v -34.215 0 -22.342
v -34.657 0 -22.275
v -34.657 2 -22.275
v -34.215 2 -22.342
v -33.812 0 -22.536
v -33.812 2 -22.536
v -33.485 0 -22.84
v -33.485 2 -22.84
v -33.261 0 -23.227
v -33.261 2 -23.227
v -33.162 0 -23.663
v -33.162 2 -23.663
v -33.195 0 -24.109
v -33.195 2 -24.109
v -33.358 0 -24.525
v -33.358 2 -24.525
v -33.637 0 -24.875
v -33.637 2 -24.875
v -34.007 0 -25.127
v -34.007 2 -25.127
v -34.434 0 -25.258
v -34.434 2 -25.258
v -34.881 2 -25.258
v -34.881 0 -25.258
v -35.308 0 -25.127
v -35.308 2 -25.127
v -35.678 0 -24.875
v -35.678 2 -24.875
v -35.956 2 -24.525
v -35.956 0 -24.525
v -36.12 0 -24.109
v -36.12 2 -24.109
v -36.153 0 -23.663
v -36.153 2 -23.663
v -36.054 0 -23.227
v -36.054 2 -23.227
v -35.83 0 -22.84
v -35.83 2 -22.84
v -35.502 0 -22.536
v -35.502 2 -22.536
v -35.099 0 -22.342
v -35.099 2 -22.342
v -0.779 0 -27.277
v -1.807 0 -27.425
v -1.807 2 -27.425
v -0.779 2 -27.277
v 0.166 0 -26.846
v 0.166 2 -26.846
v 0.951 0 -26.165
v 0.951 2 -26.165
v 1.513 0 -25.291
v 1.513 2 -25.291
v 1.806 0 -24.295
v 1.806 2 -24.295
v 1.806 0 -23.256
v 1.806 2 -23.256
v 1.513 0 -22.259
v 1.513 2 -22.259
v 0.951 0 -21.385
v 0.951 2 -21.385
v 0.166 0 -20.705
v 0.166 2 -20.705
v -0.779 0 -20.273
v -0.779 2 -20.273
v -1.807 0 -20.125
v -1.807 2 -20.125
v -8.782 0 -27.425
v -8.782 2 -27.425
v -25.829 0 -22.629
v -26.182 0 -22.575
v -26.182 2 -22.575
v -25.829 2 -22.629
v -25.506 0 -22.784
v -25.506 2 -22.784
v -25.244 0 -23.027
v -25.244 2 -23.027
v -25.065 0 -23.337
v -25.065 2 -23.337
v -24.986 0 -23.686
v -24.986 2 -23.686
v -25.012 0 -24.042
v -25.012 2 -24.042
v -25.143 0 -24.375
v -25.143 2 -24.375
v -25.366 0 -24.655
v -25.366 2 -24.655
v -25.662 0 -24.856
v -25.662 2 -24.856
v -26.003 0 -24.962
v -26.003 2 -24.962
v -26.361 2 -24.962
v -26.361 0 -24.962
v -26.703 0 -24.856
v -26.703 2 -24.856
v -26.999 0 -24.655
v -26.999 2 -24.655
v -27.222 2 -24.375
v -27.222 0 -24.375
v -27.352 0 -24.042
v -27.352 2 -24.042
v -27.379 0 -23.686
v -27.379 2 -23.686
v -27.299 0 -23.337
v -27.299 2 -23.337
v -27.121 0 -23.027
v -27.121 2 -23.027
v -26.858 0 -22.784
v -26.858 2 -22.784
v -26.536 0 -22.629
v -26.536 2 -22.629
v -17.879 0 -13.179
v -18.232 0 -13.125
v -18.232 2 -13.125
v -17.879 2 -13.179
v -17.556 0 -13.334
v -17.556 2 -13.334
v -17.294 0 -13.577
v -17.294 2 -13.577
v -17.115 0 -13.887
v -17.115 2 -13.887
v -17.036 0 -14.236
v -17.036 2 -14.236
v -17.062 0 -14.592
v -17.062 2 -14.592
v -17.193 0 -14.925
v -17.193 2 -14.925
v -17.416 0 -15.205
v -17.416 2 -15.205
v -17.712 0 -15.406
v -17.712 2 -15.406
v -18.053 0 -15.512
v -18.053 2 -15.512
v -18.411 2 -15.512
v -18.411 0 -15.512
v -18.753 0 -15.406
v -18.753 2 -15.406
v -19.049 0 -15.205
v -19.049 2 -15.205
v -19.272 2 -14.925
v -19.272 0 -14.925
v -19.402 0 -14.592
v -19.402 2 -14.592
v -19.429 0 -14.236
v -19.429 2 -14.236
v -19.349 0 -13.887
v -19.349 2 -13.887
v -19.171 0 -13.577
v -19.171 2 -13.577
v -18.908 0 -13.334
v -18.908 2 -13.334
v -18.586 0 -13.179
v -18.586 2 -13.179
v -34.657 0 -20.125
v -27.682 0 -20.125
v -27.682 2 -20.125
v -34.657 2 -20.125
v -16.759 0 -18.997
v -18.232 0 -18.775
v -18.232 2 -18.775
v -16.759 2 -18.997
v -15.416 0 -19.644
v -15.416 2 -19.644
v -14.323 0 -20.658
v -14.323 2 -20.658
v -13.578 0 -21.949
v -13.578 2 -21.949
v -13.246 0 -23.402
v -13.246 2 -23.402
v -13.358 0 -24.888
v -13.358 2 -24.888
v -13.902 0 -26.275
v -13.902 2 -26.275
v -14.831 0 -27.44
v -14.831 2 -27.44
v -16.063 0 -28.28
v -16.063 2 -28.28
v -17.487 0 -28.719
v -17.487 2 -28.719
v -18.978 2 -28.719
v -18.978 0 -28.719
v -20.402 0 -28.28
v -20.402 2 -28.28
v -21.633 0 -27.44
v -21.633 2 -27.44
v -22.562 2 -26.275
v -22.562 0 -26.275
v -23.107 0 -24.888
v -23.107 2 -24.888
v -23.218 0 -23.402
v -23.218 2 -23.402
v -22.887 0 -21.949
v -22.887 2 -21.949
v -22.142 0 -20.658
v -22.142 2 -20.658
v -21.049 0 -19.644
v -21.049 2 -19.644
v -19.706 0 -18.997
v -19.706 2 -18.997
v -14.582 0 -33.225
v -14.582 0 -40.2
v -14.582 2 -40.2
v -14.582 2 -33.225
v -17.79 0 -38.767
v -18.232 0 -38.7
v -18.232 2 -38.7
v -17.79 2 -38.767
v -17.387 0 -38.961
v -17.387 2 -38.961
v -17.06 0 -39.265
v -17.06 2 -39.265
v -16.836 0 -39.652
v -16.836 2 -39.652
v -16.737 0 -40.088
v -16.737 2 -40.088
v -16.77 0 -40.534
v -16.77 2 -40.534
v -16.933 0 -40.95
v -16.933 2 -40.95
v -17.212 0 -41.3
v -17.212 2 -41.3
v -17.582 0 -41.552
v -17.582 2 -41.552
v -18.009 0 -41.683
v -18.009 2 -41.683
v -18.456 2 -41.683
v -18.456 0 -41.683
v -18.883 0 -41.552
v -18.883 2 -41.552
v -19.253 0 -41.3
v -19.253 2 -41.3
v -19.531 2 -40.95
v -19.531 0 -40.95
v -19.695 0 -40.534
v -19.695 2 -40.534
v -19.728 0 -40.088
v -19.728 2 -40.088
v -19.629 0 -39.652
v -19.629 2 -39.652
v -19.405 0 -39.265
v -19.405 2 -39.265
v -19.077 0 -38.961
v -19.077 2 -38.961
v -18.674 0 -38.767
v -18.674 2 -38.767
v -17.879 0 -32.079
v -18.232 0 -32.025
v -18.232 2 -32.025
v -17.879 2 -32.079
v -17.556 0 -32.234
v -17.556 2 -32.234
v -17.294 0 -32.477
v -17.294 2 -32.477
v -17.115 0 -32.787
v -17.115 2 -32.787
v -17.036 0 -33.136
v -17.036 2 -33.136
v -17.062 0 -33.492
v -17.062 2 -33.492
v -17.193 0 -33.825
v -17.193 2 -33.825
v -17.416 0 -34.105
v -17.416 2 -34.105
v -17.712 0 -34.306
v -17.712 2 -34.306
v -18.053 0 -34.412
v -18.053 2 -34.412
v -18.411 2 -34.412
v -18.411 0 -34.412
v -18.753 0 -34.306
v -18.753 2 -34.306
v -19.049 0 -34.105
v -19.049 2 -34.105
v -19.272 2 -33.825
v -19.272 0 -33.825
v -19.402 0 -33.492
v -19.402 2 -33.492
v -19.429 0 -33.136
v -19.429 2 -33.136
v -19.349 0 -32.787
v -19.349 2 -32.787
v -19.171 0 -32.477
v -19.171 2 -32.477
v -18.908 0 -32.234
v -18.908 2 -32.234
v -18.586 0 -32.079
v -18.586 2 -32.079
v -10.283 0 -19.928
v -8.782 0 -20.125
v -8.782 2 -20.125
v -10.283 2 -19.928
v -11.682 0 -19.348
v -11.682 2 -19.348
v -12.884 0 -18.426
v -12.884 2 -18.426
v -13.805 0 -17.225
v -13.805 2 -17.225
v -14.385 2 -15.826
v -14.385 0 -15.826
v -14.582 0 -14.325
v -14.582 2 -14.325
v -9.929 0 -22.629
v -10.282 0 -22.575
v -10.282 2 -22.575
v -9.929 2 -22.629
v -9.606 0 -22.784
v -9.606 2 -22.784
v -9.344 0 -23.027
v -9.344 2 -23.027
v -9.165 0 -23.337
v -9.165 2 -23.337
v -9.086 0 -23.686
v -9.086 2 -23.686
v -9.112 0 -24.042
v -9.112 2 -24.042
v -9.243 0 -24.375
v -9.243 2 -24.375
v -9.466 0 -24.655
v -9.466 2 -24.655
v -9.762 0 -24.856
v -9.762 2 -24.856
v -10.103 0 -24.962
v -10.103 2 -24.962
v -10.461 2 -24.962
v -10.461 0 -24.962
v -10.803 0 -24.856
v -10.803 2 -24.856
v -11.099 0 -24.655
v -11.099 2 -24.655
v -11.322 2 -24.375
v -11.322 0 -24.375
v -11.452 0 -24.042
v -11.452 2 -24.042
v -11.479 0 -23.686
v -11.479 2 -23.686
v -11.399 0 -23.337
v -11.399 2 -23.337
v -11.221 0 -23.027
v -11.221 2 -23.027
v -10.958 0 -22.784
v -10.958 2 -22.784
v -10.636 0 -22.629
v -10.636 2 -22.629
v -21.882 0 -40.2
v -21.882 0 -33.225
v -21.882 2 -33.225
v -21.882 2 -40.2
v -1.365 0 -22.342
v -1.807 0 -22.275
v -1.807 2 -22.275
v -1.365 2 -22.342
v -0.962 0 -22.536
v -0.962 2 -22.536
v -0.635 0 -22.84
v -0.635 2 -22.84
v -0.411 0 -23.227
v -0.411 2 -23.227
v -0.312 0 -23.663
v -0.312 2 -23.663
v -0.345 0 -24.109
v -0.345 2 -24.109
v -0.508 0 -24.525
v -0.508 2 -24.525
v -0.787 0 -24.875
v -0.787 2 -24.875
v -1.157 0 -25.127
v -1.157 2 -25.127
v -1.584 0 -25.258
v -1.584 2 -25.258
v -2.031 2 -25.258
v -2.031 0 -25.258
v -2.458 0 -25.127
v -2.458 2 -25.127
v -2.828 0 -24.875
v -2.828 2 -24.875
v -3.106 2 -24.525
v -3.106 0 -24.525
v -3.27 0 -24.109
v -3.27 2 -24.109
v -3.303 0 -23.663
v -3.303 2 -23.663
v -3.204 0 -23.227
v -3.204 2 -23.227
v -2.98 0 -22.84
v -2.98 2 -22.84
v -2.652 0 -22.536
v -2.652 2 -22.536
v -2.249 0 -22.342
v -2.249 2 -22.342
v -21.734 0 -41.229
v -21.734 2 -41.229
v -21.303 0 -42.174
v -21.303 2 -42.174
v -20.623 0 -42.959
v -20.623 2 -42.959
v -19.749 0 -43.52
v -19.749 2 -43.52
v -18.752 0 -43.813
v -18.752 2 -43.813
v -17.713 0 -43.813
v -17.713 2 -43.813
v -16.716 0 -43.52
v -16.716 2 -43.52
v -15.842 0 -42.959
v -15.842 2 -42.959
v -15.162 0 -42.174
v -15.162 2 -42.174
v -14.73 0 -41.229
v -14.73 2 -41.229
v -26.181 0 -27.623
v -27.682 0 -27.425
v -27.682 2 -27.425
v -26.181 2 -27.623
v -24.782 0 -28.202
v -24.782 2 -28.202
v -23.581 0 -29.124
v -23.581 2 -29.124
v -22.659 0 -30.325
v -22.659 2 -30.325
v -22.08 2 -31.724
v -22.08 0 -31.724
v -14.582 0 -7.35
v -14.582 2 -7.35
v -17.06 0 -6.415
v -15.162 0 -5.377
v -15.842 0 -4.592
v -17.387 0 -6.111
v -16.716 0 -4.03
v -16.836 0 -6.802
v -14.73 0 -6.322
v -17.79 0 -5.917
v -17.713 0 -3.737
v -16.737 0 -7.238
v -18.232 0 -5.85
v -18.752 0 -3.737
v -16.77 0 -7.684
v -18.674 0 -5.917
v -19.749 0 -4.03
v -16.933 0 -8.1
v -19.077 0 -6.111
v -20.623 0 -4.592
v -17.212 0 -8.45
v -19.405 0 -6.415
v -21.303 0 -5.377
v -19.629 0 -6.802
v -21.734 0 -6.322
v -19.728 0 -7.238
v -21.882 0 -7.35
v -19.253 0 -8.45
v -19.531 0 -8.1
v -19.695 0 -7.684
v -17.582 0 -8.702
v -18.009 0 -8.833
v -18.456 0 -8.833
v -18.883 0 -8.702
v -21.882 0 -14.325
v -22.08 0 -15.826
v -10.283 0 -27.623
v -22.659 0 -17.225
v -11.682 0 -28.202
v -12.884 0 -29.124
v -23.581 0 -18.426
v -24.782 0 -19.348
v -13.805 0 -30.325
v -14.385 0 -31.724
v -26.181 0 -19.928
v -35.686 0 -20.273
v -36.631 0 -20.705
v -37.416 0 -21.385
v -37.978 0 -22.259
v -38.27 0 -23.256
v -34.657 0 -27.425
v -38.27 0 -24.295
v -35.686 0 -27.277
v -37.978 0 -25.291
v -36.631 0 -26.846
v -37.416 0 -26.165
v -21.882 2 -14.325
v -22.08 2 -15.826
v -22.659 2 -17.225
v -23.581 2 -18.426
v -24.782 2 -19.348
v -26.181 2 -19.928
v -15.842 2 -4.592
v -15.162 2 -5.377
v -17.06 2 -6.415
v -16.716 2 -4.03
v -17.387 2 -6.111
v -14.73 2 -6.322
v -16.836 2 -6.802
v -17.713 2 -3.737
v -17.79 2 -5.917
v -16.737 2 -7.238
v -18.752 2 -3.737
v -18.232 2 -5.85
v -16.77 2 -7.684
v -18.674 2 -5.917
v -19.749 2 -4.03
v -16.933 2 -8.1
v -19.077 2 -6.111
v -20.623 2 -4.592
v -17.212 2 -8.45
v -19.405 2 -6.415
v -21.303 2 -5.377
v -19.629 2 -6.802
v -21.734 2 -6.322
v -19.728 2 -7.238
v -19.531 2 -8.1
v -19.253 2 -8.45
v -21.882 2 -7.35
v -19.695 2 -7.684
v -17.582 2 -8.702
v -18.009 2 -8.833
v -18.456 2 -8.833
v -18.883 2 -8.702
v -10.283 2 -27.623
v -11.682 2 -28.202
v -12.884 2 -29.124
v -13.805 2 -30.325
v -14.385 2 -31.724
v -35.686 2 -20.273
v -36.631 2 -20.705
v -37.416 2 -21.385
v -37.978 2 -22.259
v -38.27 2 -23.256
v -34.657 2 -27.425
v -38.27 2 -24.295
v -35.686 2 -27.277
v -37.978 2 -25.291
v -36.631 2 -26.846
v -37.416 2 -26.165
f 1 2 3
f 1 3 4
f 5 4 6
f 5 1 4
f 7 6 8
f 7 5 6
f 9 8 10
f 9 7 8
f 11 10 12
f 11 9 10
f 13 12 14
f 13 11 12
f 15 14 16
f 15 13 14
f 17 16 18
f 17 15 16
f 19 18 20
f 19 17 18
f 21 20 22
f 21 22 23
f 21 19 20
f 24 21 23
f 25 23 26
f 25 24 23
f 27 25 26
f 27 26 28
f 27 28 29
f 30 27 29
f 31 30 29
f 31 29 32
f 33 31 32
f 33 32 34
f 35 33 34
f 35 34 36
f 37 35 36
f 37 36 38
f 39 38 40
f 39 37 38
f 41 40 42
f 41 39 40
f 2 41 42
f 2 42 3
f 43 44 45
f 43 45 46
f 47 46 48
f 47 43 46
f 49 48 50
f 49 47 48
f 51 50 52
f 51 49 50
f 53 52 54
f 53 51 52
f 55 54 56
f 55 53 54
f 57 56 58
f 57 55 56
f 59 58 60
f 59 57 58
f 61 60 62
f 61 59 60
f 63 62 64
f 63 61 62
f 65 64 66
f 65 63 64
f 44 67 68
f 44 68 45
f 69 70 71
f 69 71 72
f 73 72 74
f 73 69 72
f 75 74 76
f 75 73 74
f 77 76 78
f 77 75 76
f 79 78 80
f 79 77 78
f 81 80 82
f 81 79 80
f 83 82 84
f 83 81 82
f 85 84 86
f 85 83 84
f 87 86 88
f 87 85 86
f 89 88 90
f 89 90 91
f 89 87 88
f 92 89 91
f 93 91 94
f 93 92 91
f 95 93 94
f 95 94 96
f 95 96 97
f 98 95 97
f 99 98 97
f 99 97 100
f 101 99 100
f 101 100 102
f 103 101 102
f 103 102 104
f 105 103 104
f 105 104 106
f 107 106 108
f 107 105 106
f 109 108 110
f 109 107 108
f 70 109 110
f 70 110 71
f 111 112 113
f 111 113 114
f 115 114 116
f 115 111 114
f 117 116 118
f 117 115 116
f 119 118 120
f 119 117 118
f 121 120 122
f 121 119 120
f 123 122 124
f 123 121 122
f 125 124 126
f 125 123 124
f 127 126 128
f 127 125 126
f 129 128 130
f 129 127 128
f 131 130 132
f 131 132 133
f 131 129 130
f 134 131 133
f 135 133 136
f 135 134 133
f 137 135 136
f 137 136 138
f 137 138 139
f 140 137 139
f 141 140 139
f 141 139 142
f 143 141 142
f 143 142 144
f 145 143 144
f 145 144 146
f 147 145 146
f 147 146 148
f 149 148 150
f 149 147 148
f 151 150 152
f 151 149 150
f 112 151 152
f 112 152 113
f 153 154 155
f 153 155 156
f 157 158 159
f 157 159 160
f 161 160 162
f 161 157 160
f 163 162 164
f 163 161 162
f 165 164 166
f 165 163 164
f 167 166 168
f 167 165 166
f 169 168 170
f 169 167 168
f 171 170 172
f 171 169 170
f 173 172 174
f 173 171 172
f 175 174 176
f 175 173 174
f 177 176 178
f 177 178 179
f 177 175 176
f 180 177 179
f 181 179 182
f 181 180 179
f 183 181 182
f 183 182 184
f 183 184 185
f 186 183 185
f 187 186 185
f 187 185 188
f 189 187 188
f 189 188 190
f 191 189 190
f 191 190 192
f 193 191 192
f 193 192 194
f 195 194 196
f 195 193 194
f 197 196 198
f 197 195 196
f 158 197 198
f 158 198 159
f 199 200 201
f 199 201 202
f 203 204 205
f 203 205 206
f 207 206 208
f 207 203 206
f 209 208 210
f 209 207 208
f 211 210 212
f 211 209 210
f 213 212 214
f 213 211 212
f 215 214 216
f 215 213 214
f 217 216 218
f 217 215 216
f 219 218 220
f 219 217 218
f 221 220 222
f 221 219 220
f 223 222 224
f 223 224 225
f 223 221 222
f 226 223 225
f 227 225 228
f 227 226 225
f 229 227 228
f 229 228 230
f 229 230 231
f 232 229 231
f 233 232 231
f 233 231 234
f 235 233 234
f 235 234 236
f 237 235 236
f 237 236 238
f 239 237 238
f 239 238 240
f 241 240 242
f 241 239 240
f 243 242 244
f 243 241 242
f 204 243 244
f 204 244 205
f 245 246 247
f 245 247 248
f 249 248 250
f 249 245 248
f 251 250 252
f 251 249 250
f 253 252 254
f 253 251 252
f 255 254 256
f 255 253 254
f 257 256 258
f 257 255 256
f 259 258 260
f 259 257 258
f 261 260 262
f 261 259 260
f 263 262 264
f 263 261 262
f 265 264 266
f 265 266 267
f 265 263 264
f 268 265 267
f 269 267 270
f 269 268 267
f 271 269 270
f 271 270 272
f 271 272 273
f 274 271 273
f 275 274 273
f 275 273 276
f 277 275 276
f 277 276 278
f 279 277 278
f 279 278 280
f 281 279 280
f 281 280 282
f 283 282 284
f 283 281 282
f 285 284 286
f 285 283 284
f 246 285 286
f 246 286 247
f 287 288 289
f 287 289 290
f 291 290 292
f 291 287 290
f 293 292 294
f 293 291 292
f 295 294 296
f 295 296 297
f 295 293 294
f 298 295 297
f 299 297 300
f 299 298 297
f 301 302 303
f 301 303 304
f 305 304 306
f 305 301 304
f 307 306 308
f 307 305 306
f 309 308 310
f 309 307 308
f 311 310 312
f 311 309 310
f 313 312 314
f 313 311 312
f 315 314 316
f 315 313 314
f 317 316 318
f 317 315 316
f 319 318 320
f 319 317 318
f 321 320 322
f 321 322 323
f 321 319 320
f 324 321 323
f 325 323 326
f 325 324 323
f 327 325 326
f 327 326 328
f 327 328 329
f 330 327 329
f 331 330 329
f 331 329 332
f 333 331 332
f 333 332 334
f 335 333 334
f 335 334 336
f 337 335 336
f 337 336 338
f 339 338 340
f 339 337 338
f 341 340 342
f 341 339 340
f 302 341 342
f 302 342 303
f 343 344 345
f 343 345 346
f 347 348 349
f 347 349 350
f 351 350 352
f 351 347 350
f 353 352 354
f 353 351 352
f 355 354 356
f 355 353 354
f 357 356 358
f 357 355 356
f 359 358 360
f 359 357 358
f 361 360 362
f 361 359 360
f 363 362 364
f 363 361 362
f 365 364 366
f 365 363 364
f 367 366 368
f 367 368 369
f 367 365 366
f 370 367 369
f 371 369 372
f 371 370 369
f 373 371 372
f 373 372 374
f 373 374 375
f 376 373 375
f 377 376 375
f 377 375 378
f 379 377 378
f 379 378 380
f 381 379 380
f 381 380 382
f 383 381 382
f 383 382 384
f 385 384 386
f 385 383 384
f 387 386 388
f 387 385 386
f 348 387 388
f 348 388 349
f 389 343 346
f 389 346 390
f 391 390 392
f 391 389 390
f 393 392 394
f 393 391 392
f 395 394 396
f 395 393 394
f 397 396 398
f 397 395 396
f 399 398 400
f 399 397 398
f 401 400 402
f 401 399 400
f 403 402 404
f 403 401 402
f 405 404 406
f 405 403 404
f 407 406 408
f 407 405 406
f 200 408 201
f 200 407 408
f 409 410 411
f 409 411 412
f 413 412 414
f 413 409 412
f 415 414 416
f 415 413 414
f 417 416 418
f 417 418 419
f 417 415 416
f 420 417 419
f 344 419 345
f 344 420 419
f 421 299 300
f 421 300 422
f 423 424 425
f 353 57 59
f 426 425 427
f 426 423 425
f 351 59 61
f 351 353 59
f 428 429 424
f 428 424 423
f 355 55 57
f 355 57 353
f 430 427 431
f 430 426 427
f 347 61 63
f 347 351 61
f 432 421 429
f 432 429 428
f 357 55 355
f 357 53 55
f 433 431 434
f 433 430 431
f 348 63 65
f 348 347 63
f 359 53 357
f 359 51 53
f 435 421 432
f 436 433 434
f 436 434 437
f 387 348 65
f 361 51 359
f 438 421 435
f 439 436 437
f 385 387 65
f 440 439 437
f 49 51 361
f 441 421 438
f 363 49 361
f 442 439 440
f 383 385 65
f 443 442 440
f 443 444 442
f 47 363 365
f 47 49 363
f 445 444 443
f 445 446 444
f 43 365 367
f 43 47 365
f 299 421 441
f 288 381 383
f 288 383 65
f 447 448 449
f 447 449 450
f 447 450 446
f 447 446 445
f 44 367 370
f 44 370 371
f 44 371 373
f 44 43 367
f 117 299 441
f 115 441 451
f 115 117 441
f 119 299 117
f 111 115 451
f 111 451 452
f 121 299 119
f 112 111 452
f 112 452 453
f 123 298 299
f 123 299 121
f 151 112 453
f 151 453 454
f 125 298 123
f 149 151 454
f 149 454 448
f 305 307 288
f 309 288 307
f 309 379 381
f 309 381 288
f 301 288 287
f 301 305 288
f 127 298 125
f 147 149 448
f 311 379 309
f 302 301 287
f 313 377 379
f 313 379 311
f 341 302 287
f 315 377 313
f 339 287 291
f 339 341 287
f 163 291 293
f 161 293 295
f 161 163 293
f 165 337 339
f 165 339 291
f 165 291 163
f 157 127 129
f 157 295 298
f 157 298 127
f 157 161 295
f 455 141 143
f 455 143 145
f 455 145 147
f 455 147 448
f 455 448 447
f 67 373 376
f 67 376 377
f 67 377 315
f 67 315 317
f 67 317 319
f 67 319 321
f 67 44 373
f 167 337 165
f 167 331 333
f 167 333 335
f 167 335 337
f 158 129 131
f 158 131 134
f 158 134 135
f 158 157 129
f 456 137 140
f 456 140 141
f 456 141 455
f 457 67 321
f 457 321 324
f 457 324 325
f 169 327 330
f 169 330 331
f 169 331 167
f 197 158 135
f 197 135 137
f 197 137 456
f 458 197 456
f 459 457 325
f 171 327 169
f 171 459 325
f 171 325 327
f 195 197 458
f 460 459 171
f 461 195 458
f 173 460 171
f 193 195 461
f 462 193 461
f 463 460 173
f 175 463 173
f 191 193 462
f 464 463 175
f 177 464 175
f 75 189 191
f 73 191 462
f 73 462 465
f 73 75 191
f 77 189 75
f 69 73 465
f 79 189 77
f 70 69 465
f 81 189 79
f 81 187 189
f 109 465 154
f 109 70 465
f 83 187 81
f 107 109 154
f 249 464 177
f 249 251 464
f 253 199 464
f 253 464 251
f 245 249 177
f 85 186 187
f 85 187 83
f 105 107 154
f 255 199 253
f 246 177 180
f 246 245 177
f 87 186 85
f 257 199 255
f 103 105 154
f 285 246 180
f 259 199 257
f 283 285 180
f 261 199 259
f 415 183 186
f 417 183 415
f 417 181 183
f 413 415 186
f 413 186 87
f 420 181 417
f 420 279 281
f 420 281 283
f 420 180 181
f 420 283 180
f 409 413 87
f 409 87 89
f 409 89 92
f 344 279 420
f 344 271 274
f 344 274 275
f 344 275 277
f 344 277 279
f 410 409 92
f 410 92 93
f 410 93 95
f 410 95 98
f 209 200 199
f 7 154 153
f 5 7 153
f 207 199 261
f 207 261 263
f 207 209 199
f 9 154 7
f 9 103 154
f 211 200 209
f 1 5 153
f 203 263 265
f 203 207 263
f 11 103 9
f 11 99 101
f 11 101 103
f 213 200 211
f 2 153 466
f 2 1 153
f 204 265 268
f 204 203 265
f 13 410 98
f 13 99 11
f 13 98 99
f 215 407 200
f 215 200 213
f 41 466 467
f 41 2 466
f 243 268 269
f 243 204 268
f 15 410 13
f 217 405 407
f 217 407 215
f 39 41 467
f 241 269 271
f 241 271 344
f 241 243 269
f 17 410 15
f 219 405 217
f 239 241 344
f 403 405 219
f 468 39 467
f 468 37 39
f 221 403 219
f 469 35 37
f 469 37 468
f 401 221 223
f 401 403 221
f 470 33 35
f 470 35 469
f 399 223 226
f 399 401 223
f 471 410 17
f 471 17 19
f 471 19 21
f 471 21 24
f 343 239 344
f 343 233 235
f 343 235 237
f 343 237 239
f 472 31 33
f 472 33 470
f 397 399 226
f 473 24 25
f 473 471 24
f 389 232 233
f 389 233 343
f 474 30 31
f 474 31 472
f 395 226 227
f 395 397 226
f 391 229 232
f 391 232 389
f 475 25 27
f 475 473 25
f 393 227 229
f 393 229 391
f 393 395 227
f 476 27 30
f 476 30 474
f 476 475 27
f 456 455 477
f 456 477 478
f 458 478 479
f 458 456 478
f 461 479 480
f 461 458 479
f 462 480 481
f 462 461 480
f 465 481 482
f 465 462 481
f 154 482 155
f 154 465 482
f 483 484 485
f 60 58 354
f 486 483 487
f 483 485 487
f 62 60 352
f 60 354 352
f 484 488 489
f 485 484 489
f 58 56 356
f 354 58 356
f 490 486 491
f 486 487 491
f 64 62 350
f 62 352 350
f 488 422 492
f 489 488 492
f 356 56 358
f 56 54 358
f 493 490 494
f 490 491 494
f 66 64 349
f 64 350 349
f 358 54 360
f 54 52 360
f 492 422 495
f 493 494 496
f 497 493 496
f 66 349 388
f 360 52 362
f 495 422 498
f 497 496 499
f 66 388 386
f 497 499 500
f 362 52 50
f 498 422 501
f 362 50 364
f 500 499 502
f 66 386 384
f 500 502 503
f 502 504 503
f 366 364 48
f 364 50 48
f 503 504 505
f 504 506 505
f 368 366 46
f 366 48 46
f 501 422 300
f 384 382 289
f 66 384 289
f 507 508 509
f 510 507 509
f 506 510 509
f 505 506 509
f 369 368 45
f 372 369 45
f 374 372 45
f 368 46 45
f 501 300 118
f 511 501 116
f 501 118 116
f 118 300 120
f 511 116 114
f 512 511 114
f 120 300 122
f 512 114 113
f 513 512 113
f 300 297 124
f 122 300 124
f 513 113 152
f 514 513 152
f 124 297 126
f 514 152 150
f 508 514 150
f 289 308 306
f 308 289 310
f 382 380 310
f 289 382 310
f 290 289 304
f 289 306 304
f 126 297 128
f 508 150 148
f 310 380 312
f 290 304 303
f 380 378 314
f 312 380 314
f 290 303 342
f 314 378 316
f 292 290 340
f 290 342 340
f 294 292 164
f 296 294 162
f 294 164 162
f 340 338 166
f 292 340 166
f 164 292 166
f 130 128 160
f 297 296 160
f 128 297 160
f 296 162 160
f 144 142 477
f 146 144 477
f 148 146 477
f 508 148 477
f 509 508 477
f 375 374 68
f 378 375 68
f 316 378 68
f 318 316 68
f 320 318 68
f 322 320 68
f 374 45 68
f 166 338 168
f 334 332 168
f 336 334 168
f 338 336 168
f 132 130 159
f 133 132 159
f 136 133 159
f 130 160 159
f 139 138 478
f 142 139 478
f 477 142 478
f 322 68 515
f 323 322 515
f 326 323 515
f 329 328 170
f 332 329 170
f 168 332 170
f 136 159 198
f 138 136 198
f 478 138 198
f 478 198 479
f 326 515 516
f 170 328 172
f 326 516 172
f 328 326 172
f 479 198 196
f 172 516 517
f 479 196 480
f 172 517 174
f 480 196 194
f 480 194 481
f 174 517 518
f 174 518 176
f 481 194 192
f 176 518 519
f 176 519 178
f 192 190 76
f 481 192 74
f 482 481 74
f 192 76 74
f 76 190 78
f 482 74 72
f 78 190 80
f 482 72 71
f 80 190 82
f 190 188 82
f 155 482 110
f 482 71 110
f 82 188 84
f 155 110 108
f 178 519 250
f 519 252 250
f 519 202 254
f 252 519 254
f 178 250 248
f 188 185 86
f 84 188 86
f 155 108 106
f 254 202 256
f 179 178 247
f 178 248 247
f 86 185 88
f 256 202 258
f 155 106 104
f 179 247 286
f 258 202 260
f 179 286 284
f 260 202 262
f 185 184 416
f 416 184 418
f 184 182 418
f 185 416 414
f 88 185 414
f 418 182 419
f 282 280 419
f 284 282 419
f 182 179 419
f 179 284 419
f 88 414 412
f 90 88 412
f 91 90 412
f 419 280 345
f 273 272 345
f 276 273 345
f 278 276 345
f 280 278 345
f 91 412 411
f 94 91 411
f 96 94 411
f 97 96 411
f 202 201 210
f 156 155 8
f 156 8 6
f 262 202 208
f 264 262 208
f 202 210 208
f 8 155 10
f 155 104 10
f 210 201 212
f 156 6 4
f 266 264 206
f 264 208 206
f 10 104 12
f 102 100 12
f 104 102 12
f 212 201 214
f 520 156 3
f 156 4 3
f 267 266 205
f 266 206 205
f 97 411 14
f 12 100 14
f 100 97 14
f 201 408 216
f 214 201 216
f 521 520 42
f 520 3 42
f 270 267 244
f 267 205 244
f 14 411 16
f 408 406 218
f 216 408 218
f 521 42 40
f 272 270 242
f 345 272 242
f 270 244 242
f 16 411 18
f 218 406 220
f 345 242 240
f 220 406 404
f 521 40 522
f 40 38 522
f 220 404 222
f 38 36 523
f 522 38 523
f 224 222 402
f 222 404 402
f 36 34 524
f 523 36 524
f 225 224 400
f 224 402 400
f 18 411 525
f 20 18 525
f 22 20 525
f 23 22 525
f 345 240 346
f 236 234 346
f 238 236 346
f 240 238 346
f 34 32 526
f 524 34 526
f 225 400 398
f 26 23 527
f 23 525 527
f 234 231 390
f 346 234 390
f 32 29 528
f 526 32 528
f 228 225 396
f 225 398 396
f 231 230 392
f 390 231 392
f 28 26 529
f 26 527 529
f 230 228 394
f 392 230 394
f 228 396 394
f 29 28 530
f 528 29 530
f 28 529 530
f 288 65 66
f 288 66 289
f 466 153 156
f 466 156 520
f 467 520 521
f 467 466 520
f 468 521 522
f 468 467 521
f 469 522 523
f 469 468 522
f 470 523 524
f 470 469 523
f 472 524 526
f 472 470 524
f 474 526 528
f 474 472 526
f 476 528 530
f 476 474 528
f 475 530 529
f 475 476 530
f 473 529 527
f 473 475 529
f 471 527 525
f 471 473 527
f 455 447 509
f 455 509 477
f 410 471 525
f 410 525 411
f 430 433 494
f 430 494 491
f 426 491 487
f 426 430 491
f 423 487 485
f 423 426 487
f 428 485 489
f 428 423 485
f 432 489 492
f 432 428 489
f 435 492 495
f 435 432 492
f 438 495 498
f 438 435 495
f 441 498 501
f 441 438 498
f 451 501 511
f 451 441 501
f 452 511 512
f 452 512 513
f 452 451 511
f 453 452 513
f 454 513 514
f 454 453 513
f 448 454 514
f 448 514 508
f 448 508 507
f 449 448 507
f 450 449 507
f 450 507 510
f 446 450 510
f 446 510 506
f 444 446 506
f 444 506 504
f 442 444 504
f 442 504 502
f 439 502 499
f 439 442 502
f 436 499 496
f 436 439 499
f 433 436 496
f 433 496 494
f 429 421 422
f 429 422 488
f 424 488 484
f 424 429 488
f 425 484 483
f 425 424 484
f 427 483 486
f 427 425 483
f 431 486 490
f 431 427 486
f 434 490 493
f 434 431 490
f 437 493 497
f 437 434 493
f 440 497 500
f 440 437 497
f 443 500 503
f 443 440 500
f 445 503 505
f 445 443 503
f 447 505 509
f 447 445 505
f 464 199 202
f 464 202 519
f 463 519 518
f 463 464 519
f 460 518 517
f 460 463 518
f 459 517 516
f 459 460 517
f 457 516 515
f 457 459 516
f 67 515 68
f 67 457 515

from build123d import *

# Parameters (mm, degrees)
SKETCH1_R      = 1.5
SKETCH1_R_2    = 1.2
SKETCH1_R_3    = 5
EXTRUDE1_DEPTH = 2


with BuildPart() as part:
    # Sketch1 → Extrude1 (new body)
    with BuildSketch(Plane(origin=(0, 0, 0), x_dir=(1, 0, 0), z_dir=(0, 1, 0))):
        with BuildLine():
            Line((-1.80734609, 20.125232899), (-8.78234609, 20.125232899))
            ThreePointArc((-8.78234609, 20.125232899), (-12.883565421, 18.42645223), (-14.58234609, 14.325232899))
            Line((-14.58234609, 14.325232899), (-14.58234609, 7.350232899))
            ThreePointArc((-14.58234609, 7.350232899), (-18.23234609, 3.700232899), (-21.88234609, 7.350232899))
            Line((-21.88234609, 7.350232899), (-21.88234609, 14.325232899))
            ThreePointArc((-21.88234609, 14.325232899), (-23.581126759, 18.42645223), (-27.68234609, 20.125232899))
            Line((-27.68234609, 20.125232899), (-34.65734609, 20.125232899))
            ThreePointArc((-34.65734609, 20.125232899), (-38.30734609, 23.775232899), (-34.65734609, 27.425232899))
            Line((-34.65734609, 27.425232899), (-27.68234609, 27.425232899))
            ThreePointArc((-27.68234609, 27.425232899), (-23.581126759, 29.124013568), (-21.88234609, 33.225232899))
            Line((-21.88234609, 33.225232899), (-21.88234609, 40.200232899))
            ThreePointArc((-21.88234609, 40.200232899), (-18.23234609, 43.850232899), (-14.58234609, 40.200232899))
            Line((-14.58234609, 40.200232899), (-14.58234609, 33.225232899))
            ThreePointArc((-14.58234609, 33.225232899), (-12.883565421, 29.124013568), (-8.78234609, 27.425232899))
            Line((-8.78234609, 27.425232899), (-1.80734609, 27.425232899))
            ThreePointArc((-1.80734609, 27.425232899), (1.84265391, 23.775232899), (-1.80734609, 20.125232899))
        make_face()
        with Locations(Location((-18.23234609, 40.200232899, 0), (0, 0, 270))):
            Circle(SKETCH1_R, mode=Mode.SUBTRACT)
        with Locations(Location((-18.23234609, 7.350232899, 0), (0, 0, 270))):
            Circle(SKETCH1_R, mode=Mode.SUBTRACT)
        with Locations(Location((-34.65734609, 23.775232899, 0), (0, 0, 270))):
            Circle(SKETCH1_R, mode=Mode.SUBTRACT)
        with Locations(Location((-1.80734609, 23.775232899, 0), (0, 0, 270))):
            Circle(SKETCH1_R, mode=Mode.SUBTRACT)
        with Locations(Location((-26.18234609, 23.775232899, 0), (0, 0, 270))):
            Circle(SKETCH1_R_2, mode=Mode.SUBTRACT)
        with Locations(Location((-10.28234609, 23.775232899, 0), (0, 0, 270))):
            Circle(SKETCH1_R_2, mode=Mode.SUBTRACT)
        with Locations(Location((-18.23234609, 33.225232899, 0), (0, 0, 270))):
            Circle(SKETCH1_R_2, mode=Mode.SUBTRACT)
        with Locations(Location((-18.23234609, 14.325232899, 0), (0, 0, 270))):
            Circle(SKETCH1_R_2, mode=Mode.SUBTRACT)
        with Locations(Location((-18.23234609, 23.775232899, 0), (0, 0, 270))):
            Circle(SKETCH1_R_3, mode=Mode.SUBTRACT)
    extrude(amount=EXTRUDE1_DEPTH)


solid = part.part
